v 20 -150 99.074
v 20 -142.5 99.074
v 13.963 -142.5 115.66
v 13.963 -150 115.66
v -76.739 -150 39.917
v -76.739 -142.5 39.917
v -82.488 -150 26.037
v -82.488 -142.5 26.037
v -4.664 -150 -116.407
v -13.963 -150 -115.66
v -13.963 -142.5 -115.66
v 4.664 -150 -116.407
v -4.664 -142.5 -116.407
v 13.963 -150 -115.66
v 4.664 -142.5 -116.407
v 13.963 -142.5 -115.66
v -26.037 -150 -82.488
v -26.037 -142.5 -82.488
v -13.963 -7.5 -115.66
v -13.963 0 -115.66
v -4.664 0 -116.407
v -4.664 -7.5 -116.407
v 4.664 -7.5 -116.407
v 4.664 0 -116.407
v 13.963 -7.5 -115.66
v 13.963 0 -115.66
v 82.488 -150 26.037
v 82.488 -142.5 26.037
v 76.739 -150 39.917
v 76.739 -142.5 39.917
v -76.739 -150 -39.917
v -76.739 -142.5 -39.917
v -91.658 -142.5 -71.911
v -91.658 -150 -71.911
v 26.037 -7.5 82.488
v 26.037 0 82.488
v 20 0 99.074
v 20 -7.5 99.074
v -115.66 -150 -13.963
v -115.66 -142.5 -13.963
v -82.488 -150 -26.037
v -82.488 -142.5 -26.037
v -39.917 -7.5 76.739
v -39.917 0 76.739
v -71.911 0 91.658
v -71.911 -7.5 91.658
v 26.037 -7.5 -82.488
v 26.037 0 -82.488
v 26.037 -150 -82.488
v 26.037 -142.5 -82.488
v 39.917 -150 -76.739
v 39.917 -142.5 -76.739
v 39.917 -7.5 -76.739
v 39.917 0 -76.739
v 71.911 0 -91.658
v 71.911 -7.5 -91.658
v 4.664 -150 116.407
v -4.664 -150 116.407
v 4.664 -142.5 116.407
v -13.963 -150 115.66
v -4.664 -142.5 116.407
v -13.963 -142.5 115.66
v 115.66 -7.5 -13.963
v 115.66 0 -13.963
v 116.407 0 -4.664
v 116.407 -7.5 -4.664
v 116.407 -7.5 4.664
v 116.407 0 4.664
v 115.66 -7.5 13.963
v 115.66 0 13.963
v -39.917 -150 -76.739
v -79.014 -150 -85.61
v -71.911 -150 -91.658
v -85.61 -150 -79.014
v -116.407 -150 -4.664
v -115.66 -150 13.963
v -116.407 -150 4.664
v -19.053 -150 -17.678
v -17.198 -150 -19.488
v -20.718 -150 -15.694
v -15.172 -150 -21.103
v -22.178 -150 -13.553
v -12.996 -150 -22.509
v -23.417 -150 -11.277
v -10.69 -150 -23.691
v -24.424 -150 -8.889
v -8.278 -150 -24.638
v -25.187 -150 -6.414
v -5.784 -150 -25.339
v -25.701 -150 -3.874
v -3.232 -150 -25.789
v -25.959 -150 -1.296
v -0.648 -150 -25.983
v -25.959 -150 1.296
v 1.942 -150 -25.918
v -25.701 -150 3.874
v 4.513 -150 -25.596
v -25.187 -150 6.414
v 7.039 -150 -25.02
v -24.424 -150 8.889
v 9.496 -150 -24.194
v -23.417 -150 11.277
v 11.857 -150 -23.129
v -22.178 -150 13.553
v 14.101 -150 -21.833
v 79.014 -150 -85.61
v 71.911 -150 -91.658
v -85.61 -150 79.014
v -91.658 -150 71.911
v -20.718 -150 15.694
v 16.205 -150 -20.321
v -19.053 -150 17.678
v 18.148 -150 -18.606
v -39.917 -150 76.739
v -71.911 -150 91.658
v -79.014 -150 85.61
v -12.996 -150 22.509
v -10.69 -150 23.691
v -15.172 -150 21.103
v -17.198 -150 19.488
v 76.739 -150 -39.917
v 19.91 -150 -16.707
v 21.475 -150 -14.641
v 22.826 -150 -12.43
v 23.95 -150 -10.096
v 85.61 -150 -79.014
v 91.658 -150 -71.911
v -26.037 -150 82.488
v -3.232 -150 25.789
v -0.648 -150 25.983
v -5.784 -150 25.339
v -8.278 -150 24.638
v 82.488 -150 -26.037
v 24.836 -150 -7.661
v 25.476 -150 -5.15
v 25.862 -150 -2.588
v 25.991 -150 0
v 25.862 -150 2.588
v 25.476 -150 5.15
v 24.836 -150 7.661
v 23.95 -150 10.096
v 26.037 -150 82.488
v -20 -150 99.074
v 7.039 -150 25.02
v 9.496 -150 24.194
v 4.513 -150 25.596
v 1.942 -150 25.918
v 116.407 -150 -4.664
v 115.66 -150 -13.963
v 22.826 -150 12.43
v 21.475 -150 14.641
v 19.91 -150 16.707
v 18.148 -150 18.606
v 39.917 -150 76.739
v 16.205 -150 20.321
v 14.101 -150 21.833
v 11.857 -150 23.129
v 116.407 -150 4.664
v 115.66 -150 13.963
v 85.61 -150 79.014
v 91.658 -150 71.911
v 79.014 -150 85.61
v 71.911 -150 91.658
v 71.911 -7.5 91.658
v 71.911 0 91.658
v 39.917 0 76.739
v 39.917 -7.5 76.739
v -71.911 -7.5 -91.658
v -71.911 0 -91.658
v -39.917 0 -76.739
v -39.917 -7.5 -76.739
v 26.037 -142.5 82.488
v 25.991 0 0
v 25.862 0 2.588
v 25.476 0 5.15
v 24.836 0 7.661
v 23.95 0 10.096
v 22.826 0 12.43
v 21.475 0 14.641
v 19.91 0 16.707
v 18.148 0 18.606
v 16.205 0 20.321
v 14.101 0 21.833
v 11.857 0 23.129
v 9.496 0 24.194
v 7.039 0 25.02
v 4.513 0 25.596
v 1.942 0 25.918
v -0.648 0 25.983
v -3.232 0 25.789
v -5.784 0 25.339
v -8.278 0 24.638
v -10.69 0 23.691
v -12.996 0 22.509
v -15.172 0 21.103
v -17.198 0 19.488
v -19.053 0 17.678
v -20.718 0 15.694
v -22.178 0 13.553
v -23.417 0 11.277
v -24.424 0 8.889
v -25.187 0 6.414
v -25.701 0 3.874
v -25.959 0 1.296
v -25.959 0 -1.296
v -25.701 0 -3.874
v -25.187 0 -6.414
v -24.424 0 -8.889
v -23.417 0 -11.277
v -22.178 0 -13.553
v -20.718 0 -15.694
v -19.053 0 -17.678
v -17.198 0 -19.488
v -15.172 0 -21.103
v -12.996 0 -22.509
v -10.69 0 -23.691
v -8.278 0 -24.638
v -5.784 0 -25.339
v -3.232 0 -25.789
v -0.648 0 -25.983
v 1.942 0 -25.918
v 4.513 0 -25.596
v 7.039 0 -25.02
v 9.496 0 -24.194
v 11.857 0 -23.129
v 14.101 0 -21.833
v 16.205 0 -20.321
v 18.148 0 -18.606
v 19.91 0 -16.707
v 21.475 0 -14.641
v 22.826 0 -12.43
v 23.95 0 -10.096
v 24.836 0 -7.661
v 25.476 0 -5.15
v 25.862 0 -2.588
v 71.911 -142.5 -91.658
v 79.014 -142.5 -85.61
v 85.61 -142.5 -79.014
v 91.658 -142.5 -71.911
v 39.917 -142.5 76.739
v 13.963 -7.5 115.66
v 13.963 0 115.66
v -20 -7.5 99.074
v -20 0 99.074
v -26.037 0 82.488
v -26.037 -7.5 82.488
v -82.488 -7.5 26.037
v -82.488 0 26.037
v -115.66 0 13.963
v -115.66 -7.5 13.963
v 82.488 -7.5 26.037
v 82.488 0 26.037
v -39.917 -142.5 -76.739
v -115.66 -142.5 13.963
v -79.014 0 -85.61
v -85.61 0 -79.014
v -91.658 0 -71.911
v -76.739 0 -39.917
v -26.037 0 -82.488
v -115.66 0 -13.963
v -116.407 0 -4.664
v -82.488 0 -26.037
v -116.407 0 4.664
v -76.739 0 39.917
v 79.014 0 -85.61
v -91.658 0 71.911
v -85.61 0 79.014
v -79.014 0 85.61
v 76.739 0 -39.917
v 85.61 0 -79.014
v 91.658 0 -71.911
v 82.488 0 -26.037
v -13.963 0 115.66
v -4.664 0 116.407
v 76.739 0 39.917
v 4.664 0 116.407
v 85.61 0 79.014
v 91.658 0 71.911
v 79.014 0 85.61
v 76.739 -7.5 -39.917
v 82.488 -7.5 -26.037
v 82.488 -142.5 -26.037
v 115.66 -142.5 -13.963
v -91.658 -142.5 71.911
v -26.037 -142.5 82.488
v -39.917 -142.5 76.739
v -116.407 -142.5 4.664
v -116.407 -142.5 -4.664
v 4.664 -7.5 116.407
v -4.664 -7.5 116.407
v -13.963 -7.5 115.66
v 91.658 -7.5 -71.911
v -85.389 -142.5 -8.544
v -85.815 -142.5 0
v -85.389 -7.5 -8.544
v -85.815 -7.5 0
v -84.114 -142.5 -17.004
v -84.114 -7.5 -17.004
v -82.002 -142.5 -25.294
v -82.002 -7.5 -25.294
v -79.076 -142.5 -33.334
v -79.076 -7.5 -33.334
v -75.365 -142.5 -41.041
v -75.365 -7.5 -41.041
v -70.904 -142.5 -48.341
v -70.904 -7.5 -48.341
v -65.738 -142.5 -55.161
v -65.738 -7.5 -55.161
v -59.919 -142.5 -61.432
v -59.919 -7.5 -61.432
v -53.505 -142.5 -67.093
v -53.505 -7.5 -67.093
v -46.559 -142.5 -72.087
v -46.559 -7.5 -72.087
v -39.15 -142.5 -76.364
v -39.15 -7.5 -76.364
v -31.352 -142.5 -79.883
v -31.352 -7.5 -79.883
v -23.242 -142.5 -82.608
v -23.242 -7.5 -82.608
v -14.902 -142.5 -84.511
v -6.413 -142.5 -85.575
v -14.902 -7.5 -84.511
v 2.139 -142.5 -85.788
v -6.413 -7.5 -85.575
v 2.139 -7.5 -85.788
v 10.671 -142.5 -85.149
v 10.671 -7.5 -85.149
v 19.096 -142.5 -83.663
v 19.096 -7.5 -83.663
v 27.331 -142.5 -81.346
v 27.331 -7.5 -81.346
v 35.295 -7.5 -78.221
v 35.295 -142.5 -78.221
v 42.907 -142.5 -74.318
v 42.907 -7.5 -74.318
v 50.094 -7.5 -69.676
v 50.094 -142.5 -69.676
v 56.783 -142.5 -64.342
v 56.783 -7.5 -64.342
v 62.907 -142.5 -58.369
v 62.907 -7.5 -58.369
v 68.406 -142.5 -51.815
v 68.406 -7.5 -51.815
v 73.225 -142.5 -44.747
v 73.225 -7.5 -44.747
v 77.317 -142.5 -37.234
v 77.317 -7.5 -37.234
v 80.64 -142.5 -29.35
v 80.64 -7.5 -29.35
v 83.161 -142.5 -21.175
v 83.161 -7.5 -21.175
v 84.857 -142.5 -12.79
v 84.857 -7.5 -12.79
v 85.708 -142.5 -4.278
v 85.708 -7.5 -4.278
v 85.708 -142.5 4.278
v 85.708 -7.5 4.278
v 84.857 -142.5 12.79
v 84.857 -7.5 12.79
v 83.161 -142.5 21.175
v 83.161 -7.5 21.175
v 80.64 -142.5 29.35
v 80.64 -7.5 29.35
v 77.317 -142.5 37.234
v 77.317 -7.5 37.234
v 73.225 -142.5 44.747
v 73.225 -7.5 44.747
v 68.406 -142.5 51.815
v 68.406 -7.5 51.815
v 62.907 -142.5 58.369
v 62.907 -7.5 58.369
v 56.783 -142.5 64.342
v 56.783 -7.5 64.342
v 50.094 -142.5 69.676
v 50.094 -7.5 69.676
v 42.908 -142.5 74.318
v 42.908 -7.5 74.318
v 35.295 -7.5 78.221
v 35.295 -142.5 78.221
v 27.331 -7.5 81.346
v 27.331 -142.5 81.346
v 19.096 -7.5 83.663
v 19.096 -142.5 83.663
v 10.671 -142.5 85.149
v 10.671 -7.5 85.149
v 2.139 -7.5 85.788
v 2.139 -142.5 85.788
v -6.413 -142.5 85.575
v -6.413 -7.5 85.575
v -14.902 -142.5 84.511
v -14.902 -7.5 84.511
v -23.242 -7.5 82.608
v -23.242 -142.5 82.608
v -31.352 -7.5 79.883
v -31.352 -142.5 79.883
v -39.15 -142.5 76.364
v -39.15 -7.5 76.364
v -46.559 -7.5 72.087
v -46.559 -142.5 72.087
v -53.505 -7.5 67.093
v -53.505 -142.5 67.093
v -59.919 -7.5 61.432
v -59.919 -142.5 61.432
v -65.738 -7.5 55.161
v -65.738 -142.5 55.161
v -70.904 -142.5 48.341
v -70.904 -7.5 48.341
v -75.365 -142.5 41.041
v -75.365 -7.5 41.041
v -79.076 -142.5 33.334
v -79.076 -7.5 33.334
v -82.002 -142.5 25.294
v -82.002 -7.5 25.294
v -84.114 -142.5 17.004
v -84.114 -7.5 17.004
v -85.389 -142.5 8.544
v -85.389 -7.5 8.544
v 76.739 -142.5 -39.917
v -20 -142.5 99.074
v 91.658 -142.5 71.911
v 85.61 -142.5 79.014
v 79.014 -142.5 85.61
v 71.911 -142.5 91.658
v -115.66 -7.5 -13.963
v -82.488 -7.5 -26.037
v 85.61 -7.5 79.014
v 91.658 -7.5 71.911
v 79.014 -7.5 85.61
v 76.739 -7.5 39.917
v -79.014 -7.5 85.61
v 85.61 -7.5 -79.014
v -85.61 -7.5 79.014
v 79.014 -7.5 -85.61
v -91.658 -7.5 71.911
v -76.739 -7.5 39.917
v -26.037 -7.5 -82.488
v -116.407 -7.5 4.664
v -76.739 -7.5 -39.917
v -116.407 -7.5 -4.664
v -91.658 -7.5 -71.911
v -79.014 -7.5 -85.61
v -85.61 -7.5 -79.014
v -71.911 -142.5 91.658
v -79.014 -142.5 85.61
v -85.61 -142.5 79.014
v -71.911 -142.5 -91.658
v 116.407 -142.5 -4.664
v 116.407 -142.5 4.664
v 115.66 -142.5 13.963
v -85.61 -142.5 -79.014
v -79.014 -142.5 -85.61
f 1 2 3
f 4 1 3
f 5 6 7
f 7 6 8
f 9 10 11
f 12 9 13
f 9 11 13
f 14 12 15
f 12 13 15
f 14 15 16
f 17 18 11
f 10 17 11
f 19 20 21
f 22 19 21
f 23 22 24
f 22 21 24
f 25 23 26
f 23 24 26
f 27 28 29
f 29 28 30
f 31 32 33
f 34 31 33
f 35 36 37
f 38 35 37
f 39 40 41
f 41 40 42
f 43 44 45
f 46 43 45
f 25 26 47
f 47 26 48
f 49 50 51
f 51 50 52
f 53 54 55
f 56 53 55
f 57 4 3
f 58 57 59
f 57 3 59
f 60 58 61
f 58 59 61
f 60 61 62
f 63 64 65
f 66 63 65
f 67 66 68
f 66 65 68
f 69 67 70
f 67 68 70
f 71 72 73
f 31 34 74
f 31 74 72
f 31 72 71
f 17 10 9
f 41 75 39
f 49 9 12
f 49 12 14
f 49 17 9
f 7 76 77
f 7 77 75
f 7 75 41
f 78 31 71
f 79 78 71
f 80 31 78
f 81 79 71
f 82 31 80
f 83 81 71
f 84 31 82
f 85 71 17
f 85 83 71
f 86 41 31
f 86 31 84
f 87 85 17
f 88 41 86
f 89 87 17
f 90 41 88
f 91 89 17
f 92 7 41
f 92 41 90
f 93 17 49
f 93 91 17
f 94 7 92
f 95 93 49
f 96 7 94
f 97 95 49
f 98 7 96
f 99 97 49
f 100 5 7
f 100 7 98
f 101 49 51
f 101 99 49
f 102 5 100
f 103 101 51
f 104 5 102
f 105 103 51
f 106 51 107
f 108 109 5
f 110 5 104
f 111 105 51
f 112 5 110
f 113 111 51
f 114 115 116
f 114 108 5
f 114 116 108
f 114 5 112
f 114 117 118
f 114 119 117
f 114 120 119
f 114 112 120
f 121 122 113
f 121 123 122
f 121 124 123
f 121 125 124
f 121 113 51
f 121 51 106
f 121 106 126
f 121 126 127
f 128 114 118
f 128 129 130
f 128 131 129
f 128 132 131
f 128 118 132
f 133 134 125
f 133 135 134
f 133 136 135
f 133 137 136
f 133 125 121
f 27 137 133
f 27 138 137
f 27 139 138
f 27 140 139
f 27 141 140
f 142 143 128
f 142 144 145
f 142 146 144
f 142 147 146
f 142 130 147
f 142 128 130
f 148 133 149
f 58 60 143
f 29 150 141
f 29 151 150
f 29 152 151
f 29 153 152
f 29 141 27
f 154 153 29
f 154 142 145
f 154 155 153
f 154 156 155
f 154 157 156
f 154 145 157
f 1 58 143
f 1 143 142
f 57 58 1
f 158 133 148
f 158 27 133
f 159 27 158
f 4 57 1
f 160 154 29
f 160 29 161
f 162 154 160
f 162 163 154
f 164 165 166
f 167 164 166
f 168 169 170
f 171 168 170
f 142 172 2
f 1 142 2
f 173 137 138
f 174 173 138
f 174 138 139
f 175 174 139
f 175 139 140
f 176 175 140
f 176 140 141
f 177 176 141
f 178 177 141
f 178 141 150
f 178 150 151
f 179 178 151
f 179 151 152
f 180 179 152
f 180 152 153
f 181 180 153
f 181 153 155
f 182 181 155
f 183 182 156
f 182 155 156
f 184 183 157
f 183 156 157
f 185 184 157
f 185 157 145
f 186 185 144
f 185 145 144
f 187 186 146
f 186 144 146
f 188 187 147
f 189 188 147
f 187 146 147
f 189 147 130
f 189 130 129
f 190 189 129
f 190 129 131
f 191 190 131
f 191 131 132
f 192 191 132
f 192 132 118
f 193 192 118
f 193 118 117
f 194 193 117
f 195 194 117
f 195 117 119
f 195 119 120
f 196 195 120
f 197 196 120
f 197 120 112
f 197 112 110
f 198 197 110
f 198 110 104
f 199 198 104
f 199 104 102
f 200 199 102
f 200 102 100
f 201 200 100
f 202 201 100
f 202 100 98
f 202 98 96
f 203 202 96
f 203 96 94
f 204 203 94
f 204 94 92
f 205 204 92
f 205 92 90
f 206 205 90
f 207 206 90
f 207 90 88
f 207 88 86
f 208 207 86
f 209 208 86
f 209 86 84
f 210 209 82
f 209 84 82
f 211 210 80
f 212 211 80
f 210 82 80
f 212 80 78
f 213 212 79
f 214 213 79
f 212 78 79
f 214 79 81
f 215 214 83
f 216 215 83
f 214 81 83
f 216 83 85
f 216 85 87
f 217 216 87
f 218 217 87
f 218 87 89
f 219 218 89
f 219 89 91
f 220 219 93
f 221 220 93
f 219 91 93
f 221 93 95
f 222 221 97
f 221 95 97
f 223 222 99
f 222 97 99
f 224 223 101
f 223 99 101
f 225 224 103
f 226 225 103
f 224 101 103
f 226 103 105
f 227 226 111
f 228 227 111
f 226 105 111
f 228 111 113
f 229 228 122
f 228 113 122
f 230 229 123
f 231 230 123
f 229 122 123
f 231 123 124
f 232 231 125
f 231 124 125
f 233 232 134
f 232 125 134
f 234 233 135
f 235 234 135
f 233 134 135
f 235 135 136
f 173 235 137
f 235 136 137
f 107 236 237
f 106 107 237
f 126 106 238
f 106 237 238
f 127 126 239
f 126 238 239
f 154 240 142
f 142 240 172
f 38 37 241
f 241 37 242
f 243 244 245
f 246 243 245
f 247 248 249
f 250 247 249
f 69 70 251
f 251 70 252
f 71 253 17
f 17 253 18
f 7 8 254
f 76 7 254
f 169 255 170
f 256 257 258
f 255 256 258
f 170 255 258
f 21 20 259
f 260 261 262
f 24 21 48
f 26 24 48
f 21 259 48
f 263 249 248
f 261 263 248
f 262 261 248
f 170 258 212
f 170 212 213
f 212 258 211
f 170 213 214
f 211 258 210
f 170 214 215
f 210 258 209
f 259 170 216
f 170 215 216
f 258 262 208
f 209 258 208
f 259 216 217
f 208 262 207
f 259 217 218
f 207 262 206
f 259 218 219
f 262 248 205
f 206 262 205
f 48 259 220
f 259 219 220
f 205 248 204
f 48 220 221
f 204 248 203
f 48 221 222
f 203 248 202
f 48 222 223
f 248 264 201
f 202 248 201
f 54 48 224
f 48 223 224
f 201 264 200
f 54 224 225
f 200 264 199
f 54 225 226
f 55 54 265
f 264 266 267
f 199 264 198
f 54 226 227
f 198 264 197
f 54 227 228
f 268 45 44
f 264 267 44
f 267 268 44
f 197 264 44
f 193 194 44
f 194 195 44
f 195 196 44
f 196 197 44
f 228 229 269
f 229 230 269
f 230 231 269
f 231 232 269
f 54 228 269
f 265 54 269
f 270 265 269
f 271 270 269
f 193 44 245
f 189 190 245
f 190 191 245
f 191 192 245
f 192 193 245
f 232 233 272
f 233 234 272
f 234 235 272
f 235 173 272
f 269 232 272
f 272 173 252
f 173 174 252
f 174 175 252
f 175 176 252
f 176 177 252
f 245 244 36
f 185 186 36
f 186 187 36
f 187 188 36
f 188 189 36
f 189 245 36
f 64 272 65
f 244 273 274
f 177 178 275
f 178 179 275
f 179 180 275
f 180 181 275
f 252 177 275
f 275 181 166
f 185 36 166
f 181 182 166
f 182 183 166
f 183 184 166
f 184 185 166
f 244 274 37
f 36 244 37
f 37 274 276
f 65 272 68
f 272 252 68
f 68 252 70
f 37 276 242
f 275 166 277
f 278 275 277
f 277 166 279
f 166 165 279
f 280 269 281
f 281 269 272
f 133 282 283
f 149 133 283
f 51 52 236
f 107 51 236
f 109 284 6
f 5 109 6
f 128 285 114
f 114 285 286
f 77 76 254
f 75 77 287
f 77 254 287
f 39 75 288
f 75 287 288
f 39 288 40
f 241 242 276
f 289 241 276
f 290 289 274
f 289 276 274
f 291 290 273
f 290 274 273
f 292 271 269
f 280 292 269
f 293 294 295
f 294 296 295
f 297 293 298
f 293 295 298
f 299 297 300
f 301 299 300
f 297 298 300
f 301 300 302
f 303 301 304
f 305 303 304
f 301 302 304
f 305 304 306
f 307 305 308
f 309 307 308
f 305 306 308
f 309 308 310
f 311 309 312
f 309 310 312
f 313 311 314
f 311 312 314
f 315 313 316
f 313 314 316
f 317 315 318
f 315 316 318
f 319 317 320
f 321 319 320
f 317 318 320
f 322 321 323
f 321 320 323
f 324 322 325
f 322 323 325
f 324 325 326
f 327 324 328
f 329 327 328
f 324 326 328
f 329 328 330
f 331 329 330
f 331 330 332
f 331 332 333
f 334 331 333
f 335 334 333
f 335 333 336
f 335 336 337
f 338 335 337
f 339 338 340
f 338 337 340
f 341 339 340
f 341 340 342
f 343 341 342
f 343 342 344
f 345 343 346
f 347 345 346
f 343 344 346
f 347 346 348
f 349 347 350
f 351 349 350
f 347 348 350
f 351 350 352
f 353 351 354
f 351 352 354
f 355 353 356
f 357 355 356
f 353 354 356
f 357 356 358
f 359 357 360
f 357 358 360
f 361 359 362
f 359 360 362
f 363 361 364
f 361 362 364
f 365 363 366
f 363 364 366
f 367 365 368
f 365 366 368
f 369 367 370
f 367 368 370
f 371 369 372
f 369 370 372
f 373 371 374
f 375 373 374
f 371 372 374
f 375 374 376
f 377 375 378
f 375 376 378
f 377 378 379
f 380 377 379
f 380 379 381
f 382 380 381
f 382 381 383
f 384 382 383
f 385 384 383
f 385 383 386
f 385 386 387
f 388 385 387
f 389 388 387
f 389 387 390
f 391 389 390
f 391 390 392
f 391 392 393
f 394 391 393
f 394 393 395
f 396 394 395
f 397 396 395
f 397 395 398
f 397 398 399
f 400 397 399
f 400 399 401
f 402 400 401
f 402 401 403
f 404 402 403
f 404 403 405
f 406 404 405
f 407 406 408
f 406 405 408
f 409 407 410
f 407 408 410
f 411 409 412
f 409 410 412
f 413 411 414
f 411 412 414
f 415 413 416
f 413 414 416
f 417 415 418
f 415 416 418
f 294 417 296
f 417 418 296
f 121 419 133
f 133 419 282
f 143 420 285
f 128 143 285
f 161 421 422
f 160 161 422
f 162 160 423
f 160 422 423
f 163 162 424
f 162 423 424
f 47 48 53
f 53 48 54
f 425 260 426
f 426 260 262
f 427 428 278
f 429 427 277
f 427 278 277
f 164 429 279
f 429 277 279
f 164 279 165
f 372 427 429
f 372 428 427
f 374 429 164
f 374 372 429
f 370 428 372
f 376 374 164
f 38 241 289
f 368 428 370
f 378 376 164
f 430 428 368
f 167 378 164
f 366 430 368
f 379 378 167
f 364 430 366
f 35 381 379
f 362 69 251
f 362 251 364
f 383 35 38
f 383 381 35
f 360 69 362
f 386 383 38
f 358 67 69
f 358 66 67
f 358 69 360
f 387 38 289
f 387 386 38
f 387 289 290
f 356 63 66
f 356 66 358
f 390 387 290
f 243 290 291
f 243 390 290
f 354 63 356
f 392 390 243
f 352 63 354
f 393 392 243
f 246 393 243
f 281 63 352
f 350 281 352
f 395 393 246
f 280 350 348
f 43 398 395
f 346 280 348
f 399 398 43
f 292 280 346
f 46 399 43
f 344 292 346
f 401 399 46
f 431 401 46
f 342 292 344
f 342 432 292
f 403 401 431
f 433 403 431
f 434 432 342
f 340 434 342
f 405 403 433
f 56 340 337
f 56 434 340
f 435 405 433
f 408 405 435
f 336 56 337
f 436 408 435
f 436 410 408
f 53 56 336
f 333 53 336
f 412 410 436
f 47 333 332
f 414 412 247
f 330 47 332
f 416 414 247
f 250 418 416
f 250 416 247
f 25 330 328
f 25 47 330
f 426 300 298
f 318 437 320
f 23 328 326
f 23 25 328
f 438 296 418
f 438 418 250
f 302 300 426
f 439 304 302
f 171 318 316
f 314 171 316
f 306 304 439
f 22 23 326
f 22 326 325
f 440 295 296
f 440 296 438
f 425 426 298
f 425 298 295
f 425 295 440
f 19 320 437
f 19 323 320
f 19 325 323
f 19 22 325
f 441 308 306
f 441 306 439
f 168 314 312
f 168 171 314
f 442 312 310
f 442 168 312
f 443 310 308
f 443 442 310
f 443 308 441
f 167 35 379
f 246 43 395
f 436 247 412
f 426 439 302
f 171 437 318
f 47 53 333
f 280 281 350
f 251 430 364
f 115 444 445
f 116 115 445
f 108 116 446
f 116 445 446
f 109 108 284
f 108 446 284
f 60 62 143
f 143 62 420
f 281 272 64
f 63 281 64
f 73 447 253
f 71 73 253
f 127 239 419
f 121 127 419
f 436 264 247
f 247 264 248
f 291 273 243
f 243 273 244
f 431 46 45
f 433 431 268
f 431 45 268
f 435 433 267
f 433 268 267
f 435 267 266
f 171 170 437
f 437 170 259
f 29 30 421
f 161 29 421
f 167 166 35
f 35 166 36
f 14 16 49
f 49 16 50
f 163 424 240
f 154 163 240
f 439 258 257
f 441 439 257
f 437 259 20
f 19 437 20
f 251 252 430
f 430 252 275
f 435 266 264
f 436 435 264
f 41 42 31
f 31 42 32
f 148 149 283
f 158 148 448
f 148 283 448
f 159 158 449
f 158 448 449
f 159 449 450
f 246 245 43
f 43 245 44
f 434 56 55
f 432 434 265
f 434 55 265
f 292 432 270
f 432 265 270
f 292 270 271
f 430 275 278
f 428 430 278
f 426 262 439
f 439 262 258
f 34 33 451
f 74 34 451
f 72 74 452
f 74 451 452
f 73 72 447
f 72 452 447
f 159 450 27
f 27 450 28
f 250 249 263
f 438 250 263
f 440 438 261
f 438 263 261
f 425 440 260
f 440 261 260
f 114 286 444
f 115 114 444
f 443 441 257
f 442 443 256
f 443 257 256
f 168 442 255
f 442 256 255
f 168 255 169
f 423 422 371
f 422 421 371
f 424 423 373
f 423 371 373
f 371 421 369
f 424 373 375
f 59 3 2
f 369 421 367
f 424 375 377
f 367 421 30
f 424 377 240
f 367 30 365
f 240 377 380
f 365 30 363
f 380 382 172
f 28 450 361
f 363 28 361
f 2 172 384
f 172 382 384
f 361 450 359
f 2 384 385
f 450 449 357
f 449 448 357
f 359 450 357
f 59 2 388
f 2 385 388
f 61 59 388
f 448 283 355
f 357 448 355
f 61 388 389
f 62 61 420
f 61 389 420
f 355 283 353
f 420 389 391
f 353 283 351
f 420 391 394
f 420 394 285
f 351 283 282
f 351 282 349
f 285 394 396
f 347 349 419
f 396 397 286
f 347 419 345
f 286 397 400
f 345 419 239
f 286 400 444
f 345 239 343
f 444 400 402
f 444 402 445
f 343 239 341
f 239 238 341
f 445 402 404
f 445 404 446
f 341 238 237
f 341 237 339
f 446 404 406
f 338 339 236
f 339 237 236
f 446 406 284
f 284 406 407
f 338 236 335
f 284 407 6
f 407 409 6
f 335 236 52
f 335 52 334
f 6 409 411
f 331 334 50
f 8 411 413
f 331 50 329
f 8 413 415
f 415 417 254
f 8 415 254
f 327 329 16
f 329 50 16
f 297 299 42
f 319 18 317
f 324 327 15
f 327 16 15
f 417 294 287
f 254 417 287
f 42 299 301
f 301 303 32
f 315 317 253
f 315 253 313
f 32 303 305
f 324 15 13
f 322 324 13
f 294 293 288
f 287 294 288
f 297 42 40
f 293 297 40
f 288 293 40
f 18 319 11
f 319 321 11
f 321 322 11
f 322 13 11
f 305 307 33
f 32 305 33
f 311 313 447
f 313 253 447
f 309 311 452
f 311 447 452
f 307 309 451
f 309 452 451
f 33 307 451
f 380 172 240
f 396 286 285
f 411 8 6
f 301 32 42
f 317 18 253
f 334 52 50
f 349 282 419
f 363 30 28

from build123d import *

# Parameters (mm, degrees)
F1_DEPTH = 150
F2_W     = 60
F2_H     = 135
F4_R     = 25.991118
F5_DEPTH = 150.001


with BuildPart() as f1:
    # F0 (on Front) → F1 (new body)
    with BuildSketch(Plane.XZ):
        with BuildLine():
            Line((26.036771, 82.488403), (20, 99.074293))
            Line((20, 99.074293), (-20, 99.074293))
            Line((-20, 99.074293), (-26.036771, 82.488403))
            Line((-26.036771, 82.488403), (-39.917332, 76.738886))
            Line((-39.917332, 76.738886), (-71.910606, 91.657595))
            ThreePointArc((-71.910606, 91.657595), (-82.37794, 82.37794), (-91.657595, 71.910606))
            Line((-91.657595, 71.910606), (-76.738886, 39.917332))
            Line((-76.738886, 39.917332), (-82.488403, 26.036771))
            Line((-82.488403, 26.036771), (-115.660184, 13.963229))
            ThreePointArc((-115.660184, 13.963229), (-116.5, 0), (-115.660184, -13.963229))
            Line((-115.660184, -13.963229), (-82.488403, -26.036771))
            Line((-82.488403, -26.036771), (-76.738886, -39.917332))
            Line((-76.738886, -39.917332), (-91.657595, -71.910606))
            ThreePointArc((-91.657595, -71.910606), (-82.37794, -82.37794), (-71.910606, -91.657595))
            Line((-71.910606, -91.657595), (-39.917332, -76.738886))
            Line((-39.917332, -76.738886), (-26.036771, -82.488403))
            Line((-26.036771, -82.488403), (-13.963229, -115.660184))
            ThreePointArc((-13.963229, -115.660184), (0, -116.5), (13.963229, -115.660184))
            Line((13.963229, -115.660184), (26.036771, -82.488403))
            Line((26.036771, -82.488403), (39.917332, -76.738886))
            Line((39.917332, -76.738886), (71.910606, -91.657595))
            ThreePointArc((71.910606, -91.657595), (82.37794, -82.37794), (91.657595, -71.910606))
            Line((91.657595, -71.910606), (76.738886, -39.917332))
            Line((76.738886, -39.917332), (82.488403, -26.036771))
            Line((82.488403, -26.036771), (115.660184, -13.963229))
            ThreePointArc((115.660184, -13.963229), (116.5, 0), (115.660184, 13.963229))
            Line((115.660184, 13.963229), (82.488403, 26.036771))
            Line((82.488403, 26.036771), (76.738886, 39.917332))
            Line((76.738886, 39.917332), (91.657595, 71.910606))
            ThreePointArc((91.657595, 71.910606), (82.37794, 82.37794), (71.910606, 91.657595))
            Line((71.910606, 91.657595), (39.917332, 76.738886))
            Line((39.917332, 76.738886), (26.036771, 82.488403))
        make_face()
        with BuildLine():
            Line((20, 99.074293), (13.963229, 115.660184))
            ThreePointArc((13.963229, 115.660184), (0, 116.5), (-13.963229, 115.660184))
            Line((-13.963229, 115.660184), (-20, 99.074293))
            Line((-20, 99.074293), (20, 99.074293))
        make_face()
    extrude(amount=F1_DEPTH)

    # F2 (on Top) → F3 (revolve, cut)
    with BuildSketch(Plane.XY):
        with Locations((-115.815, -75)):
            Rectangle(F2_W, F2_H)
    revolve(axis=Axis((0, -79.557486, 0), (0, -1, 0)), mode=Mode.SUBTRACT)

    # F4 (on face) → F5 (cut, through all)
    with BuildSketch(Plane.XZ.offset(150)):
        Circle(F4_R)
    extrude(amount=-F5_DEPTH, mode=Mode.SUBTRACT)


solid = f1.part
